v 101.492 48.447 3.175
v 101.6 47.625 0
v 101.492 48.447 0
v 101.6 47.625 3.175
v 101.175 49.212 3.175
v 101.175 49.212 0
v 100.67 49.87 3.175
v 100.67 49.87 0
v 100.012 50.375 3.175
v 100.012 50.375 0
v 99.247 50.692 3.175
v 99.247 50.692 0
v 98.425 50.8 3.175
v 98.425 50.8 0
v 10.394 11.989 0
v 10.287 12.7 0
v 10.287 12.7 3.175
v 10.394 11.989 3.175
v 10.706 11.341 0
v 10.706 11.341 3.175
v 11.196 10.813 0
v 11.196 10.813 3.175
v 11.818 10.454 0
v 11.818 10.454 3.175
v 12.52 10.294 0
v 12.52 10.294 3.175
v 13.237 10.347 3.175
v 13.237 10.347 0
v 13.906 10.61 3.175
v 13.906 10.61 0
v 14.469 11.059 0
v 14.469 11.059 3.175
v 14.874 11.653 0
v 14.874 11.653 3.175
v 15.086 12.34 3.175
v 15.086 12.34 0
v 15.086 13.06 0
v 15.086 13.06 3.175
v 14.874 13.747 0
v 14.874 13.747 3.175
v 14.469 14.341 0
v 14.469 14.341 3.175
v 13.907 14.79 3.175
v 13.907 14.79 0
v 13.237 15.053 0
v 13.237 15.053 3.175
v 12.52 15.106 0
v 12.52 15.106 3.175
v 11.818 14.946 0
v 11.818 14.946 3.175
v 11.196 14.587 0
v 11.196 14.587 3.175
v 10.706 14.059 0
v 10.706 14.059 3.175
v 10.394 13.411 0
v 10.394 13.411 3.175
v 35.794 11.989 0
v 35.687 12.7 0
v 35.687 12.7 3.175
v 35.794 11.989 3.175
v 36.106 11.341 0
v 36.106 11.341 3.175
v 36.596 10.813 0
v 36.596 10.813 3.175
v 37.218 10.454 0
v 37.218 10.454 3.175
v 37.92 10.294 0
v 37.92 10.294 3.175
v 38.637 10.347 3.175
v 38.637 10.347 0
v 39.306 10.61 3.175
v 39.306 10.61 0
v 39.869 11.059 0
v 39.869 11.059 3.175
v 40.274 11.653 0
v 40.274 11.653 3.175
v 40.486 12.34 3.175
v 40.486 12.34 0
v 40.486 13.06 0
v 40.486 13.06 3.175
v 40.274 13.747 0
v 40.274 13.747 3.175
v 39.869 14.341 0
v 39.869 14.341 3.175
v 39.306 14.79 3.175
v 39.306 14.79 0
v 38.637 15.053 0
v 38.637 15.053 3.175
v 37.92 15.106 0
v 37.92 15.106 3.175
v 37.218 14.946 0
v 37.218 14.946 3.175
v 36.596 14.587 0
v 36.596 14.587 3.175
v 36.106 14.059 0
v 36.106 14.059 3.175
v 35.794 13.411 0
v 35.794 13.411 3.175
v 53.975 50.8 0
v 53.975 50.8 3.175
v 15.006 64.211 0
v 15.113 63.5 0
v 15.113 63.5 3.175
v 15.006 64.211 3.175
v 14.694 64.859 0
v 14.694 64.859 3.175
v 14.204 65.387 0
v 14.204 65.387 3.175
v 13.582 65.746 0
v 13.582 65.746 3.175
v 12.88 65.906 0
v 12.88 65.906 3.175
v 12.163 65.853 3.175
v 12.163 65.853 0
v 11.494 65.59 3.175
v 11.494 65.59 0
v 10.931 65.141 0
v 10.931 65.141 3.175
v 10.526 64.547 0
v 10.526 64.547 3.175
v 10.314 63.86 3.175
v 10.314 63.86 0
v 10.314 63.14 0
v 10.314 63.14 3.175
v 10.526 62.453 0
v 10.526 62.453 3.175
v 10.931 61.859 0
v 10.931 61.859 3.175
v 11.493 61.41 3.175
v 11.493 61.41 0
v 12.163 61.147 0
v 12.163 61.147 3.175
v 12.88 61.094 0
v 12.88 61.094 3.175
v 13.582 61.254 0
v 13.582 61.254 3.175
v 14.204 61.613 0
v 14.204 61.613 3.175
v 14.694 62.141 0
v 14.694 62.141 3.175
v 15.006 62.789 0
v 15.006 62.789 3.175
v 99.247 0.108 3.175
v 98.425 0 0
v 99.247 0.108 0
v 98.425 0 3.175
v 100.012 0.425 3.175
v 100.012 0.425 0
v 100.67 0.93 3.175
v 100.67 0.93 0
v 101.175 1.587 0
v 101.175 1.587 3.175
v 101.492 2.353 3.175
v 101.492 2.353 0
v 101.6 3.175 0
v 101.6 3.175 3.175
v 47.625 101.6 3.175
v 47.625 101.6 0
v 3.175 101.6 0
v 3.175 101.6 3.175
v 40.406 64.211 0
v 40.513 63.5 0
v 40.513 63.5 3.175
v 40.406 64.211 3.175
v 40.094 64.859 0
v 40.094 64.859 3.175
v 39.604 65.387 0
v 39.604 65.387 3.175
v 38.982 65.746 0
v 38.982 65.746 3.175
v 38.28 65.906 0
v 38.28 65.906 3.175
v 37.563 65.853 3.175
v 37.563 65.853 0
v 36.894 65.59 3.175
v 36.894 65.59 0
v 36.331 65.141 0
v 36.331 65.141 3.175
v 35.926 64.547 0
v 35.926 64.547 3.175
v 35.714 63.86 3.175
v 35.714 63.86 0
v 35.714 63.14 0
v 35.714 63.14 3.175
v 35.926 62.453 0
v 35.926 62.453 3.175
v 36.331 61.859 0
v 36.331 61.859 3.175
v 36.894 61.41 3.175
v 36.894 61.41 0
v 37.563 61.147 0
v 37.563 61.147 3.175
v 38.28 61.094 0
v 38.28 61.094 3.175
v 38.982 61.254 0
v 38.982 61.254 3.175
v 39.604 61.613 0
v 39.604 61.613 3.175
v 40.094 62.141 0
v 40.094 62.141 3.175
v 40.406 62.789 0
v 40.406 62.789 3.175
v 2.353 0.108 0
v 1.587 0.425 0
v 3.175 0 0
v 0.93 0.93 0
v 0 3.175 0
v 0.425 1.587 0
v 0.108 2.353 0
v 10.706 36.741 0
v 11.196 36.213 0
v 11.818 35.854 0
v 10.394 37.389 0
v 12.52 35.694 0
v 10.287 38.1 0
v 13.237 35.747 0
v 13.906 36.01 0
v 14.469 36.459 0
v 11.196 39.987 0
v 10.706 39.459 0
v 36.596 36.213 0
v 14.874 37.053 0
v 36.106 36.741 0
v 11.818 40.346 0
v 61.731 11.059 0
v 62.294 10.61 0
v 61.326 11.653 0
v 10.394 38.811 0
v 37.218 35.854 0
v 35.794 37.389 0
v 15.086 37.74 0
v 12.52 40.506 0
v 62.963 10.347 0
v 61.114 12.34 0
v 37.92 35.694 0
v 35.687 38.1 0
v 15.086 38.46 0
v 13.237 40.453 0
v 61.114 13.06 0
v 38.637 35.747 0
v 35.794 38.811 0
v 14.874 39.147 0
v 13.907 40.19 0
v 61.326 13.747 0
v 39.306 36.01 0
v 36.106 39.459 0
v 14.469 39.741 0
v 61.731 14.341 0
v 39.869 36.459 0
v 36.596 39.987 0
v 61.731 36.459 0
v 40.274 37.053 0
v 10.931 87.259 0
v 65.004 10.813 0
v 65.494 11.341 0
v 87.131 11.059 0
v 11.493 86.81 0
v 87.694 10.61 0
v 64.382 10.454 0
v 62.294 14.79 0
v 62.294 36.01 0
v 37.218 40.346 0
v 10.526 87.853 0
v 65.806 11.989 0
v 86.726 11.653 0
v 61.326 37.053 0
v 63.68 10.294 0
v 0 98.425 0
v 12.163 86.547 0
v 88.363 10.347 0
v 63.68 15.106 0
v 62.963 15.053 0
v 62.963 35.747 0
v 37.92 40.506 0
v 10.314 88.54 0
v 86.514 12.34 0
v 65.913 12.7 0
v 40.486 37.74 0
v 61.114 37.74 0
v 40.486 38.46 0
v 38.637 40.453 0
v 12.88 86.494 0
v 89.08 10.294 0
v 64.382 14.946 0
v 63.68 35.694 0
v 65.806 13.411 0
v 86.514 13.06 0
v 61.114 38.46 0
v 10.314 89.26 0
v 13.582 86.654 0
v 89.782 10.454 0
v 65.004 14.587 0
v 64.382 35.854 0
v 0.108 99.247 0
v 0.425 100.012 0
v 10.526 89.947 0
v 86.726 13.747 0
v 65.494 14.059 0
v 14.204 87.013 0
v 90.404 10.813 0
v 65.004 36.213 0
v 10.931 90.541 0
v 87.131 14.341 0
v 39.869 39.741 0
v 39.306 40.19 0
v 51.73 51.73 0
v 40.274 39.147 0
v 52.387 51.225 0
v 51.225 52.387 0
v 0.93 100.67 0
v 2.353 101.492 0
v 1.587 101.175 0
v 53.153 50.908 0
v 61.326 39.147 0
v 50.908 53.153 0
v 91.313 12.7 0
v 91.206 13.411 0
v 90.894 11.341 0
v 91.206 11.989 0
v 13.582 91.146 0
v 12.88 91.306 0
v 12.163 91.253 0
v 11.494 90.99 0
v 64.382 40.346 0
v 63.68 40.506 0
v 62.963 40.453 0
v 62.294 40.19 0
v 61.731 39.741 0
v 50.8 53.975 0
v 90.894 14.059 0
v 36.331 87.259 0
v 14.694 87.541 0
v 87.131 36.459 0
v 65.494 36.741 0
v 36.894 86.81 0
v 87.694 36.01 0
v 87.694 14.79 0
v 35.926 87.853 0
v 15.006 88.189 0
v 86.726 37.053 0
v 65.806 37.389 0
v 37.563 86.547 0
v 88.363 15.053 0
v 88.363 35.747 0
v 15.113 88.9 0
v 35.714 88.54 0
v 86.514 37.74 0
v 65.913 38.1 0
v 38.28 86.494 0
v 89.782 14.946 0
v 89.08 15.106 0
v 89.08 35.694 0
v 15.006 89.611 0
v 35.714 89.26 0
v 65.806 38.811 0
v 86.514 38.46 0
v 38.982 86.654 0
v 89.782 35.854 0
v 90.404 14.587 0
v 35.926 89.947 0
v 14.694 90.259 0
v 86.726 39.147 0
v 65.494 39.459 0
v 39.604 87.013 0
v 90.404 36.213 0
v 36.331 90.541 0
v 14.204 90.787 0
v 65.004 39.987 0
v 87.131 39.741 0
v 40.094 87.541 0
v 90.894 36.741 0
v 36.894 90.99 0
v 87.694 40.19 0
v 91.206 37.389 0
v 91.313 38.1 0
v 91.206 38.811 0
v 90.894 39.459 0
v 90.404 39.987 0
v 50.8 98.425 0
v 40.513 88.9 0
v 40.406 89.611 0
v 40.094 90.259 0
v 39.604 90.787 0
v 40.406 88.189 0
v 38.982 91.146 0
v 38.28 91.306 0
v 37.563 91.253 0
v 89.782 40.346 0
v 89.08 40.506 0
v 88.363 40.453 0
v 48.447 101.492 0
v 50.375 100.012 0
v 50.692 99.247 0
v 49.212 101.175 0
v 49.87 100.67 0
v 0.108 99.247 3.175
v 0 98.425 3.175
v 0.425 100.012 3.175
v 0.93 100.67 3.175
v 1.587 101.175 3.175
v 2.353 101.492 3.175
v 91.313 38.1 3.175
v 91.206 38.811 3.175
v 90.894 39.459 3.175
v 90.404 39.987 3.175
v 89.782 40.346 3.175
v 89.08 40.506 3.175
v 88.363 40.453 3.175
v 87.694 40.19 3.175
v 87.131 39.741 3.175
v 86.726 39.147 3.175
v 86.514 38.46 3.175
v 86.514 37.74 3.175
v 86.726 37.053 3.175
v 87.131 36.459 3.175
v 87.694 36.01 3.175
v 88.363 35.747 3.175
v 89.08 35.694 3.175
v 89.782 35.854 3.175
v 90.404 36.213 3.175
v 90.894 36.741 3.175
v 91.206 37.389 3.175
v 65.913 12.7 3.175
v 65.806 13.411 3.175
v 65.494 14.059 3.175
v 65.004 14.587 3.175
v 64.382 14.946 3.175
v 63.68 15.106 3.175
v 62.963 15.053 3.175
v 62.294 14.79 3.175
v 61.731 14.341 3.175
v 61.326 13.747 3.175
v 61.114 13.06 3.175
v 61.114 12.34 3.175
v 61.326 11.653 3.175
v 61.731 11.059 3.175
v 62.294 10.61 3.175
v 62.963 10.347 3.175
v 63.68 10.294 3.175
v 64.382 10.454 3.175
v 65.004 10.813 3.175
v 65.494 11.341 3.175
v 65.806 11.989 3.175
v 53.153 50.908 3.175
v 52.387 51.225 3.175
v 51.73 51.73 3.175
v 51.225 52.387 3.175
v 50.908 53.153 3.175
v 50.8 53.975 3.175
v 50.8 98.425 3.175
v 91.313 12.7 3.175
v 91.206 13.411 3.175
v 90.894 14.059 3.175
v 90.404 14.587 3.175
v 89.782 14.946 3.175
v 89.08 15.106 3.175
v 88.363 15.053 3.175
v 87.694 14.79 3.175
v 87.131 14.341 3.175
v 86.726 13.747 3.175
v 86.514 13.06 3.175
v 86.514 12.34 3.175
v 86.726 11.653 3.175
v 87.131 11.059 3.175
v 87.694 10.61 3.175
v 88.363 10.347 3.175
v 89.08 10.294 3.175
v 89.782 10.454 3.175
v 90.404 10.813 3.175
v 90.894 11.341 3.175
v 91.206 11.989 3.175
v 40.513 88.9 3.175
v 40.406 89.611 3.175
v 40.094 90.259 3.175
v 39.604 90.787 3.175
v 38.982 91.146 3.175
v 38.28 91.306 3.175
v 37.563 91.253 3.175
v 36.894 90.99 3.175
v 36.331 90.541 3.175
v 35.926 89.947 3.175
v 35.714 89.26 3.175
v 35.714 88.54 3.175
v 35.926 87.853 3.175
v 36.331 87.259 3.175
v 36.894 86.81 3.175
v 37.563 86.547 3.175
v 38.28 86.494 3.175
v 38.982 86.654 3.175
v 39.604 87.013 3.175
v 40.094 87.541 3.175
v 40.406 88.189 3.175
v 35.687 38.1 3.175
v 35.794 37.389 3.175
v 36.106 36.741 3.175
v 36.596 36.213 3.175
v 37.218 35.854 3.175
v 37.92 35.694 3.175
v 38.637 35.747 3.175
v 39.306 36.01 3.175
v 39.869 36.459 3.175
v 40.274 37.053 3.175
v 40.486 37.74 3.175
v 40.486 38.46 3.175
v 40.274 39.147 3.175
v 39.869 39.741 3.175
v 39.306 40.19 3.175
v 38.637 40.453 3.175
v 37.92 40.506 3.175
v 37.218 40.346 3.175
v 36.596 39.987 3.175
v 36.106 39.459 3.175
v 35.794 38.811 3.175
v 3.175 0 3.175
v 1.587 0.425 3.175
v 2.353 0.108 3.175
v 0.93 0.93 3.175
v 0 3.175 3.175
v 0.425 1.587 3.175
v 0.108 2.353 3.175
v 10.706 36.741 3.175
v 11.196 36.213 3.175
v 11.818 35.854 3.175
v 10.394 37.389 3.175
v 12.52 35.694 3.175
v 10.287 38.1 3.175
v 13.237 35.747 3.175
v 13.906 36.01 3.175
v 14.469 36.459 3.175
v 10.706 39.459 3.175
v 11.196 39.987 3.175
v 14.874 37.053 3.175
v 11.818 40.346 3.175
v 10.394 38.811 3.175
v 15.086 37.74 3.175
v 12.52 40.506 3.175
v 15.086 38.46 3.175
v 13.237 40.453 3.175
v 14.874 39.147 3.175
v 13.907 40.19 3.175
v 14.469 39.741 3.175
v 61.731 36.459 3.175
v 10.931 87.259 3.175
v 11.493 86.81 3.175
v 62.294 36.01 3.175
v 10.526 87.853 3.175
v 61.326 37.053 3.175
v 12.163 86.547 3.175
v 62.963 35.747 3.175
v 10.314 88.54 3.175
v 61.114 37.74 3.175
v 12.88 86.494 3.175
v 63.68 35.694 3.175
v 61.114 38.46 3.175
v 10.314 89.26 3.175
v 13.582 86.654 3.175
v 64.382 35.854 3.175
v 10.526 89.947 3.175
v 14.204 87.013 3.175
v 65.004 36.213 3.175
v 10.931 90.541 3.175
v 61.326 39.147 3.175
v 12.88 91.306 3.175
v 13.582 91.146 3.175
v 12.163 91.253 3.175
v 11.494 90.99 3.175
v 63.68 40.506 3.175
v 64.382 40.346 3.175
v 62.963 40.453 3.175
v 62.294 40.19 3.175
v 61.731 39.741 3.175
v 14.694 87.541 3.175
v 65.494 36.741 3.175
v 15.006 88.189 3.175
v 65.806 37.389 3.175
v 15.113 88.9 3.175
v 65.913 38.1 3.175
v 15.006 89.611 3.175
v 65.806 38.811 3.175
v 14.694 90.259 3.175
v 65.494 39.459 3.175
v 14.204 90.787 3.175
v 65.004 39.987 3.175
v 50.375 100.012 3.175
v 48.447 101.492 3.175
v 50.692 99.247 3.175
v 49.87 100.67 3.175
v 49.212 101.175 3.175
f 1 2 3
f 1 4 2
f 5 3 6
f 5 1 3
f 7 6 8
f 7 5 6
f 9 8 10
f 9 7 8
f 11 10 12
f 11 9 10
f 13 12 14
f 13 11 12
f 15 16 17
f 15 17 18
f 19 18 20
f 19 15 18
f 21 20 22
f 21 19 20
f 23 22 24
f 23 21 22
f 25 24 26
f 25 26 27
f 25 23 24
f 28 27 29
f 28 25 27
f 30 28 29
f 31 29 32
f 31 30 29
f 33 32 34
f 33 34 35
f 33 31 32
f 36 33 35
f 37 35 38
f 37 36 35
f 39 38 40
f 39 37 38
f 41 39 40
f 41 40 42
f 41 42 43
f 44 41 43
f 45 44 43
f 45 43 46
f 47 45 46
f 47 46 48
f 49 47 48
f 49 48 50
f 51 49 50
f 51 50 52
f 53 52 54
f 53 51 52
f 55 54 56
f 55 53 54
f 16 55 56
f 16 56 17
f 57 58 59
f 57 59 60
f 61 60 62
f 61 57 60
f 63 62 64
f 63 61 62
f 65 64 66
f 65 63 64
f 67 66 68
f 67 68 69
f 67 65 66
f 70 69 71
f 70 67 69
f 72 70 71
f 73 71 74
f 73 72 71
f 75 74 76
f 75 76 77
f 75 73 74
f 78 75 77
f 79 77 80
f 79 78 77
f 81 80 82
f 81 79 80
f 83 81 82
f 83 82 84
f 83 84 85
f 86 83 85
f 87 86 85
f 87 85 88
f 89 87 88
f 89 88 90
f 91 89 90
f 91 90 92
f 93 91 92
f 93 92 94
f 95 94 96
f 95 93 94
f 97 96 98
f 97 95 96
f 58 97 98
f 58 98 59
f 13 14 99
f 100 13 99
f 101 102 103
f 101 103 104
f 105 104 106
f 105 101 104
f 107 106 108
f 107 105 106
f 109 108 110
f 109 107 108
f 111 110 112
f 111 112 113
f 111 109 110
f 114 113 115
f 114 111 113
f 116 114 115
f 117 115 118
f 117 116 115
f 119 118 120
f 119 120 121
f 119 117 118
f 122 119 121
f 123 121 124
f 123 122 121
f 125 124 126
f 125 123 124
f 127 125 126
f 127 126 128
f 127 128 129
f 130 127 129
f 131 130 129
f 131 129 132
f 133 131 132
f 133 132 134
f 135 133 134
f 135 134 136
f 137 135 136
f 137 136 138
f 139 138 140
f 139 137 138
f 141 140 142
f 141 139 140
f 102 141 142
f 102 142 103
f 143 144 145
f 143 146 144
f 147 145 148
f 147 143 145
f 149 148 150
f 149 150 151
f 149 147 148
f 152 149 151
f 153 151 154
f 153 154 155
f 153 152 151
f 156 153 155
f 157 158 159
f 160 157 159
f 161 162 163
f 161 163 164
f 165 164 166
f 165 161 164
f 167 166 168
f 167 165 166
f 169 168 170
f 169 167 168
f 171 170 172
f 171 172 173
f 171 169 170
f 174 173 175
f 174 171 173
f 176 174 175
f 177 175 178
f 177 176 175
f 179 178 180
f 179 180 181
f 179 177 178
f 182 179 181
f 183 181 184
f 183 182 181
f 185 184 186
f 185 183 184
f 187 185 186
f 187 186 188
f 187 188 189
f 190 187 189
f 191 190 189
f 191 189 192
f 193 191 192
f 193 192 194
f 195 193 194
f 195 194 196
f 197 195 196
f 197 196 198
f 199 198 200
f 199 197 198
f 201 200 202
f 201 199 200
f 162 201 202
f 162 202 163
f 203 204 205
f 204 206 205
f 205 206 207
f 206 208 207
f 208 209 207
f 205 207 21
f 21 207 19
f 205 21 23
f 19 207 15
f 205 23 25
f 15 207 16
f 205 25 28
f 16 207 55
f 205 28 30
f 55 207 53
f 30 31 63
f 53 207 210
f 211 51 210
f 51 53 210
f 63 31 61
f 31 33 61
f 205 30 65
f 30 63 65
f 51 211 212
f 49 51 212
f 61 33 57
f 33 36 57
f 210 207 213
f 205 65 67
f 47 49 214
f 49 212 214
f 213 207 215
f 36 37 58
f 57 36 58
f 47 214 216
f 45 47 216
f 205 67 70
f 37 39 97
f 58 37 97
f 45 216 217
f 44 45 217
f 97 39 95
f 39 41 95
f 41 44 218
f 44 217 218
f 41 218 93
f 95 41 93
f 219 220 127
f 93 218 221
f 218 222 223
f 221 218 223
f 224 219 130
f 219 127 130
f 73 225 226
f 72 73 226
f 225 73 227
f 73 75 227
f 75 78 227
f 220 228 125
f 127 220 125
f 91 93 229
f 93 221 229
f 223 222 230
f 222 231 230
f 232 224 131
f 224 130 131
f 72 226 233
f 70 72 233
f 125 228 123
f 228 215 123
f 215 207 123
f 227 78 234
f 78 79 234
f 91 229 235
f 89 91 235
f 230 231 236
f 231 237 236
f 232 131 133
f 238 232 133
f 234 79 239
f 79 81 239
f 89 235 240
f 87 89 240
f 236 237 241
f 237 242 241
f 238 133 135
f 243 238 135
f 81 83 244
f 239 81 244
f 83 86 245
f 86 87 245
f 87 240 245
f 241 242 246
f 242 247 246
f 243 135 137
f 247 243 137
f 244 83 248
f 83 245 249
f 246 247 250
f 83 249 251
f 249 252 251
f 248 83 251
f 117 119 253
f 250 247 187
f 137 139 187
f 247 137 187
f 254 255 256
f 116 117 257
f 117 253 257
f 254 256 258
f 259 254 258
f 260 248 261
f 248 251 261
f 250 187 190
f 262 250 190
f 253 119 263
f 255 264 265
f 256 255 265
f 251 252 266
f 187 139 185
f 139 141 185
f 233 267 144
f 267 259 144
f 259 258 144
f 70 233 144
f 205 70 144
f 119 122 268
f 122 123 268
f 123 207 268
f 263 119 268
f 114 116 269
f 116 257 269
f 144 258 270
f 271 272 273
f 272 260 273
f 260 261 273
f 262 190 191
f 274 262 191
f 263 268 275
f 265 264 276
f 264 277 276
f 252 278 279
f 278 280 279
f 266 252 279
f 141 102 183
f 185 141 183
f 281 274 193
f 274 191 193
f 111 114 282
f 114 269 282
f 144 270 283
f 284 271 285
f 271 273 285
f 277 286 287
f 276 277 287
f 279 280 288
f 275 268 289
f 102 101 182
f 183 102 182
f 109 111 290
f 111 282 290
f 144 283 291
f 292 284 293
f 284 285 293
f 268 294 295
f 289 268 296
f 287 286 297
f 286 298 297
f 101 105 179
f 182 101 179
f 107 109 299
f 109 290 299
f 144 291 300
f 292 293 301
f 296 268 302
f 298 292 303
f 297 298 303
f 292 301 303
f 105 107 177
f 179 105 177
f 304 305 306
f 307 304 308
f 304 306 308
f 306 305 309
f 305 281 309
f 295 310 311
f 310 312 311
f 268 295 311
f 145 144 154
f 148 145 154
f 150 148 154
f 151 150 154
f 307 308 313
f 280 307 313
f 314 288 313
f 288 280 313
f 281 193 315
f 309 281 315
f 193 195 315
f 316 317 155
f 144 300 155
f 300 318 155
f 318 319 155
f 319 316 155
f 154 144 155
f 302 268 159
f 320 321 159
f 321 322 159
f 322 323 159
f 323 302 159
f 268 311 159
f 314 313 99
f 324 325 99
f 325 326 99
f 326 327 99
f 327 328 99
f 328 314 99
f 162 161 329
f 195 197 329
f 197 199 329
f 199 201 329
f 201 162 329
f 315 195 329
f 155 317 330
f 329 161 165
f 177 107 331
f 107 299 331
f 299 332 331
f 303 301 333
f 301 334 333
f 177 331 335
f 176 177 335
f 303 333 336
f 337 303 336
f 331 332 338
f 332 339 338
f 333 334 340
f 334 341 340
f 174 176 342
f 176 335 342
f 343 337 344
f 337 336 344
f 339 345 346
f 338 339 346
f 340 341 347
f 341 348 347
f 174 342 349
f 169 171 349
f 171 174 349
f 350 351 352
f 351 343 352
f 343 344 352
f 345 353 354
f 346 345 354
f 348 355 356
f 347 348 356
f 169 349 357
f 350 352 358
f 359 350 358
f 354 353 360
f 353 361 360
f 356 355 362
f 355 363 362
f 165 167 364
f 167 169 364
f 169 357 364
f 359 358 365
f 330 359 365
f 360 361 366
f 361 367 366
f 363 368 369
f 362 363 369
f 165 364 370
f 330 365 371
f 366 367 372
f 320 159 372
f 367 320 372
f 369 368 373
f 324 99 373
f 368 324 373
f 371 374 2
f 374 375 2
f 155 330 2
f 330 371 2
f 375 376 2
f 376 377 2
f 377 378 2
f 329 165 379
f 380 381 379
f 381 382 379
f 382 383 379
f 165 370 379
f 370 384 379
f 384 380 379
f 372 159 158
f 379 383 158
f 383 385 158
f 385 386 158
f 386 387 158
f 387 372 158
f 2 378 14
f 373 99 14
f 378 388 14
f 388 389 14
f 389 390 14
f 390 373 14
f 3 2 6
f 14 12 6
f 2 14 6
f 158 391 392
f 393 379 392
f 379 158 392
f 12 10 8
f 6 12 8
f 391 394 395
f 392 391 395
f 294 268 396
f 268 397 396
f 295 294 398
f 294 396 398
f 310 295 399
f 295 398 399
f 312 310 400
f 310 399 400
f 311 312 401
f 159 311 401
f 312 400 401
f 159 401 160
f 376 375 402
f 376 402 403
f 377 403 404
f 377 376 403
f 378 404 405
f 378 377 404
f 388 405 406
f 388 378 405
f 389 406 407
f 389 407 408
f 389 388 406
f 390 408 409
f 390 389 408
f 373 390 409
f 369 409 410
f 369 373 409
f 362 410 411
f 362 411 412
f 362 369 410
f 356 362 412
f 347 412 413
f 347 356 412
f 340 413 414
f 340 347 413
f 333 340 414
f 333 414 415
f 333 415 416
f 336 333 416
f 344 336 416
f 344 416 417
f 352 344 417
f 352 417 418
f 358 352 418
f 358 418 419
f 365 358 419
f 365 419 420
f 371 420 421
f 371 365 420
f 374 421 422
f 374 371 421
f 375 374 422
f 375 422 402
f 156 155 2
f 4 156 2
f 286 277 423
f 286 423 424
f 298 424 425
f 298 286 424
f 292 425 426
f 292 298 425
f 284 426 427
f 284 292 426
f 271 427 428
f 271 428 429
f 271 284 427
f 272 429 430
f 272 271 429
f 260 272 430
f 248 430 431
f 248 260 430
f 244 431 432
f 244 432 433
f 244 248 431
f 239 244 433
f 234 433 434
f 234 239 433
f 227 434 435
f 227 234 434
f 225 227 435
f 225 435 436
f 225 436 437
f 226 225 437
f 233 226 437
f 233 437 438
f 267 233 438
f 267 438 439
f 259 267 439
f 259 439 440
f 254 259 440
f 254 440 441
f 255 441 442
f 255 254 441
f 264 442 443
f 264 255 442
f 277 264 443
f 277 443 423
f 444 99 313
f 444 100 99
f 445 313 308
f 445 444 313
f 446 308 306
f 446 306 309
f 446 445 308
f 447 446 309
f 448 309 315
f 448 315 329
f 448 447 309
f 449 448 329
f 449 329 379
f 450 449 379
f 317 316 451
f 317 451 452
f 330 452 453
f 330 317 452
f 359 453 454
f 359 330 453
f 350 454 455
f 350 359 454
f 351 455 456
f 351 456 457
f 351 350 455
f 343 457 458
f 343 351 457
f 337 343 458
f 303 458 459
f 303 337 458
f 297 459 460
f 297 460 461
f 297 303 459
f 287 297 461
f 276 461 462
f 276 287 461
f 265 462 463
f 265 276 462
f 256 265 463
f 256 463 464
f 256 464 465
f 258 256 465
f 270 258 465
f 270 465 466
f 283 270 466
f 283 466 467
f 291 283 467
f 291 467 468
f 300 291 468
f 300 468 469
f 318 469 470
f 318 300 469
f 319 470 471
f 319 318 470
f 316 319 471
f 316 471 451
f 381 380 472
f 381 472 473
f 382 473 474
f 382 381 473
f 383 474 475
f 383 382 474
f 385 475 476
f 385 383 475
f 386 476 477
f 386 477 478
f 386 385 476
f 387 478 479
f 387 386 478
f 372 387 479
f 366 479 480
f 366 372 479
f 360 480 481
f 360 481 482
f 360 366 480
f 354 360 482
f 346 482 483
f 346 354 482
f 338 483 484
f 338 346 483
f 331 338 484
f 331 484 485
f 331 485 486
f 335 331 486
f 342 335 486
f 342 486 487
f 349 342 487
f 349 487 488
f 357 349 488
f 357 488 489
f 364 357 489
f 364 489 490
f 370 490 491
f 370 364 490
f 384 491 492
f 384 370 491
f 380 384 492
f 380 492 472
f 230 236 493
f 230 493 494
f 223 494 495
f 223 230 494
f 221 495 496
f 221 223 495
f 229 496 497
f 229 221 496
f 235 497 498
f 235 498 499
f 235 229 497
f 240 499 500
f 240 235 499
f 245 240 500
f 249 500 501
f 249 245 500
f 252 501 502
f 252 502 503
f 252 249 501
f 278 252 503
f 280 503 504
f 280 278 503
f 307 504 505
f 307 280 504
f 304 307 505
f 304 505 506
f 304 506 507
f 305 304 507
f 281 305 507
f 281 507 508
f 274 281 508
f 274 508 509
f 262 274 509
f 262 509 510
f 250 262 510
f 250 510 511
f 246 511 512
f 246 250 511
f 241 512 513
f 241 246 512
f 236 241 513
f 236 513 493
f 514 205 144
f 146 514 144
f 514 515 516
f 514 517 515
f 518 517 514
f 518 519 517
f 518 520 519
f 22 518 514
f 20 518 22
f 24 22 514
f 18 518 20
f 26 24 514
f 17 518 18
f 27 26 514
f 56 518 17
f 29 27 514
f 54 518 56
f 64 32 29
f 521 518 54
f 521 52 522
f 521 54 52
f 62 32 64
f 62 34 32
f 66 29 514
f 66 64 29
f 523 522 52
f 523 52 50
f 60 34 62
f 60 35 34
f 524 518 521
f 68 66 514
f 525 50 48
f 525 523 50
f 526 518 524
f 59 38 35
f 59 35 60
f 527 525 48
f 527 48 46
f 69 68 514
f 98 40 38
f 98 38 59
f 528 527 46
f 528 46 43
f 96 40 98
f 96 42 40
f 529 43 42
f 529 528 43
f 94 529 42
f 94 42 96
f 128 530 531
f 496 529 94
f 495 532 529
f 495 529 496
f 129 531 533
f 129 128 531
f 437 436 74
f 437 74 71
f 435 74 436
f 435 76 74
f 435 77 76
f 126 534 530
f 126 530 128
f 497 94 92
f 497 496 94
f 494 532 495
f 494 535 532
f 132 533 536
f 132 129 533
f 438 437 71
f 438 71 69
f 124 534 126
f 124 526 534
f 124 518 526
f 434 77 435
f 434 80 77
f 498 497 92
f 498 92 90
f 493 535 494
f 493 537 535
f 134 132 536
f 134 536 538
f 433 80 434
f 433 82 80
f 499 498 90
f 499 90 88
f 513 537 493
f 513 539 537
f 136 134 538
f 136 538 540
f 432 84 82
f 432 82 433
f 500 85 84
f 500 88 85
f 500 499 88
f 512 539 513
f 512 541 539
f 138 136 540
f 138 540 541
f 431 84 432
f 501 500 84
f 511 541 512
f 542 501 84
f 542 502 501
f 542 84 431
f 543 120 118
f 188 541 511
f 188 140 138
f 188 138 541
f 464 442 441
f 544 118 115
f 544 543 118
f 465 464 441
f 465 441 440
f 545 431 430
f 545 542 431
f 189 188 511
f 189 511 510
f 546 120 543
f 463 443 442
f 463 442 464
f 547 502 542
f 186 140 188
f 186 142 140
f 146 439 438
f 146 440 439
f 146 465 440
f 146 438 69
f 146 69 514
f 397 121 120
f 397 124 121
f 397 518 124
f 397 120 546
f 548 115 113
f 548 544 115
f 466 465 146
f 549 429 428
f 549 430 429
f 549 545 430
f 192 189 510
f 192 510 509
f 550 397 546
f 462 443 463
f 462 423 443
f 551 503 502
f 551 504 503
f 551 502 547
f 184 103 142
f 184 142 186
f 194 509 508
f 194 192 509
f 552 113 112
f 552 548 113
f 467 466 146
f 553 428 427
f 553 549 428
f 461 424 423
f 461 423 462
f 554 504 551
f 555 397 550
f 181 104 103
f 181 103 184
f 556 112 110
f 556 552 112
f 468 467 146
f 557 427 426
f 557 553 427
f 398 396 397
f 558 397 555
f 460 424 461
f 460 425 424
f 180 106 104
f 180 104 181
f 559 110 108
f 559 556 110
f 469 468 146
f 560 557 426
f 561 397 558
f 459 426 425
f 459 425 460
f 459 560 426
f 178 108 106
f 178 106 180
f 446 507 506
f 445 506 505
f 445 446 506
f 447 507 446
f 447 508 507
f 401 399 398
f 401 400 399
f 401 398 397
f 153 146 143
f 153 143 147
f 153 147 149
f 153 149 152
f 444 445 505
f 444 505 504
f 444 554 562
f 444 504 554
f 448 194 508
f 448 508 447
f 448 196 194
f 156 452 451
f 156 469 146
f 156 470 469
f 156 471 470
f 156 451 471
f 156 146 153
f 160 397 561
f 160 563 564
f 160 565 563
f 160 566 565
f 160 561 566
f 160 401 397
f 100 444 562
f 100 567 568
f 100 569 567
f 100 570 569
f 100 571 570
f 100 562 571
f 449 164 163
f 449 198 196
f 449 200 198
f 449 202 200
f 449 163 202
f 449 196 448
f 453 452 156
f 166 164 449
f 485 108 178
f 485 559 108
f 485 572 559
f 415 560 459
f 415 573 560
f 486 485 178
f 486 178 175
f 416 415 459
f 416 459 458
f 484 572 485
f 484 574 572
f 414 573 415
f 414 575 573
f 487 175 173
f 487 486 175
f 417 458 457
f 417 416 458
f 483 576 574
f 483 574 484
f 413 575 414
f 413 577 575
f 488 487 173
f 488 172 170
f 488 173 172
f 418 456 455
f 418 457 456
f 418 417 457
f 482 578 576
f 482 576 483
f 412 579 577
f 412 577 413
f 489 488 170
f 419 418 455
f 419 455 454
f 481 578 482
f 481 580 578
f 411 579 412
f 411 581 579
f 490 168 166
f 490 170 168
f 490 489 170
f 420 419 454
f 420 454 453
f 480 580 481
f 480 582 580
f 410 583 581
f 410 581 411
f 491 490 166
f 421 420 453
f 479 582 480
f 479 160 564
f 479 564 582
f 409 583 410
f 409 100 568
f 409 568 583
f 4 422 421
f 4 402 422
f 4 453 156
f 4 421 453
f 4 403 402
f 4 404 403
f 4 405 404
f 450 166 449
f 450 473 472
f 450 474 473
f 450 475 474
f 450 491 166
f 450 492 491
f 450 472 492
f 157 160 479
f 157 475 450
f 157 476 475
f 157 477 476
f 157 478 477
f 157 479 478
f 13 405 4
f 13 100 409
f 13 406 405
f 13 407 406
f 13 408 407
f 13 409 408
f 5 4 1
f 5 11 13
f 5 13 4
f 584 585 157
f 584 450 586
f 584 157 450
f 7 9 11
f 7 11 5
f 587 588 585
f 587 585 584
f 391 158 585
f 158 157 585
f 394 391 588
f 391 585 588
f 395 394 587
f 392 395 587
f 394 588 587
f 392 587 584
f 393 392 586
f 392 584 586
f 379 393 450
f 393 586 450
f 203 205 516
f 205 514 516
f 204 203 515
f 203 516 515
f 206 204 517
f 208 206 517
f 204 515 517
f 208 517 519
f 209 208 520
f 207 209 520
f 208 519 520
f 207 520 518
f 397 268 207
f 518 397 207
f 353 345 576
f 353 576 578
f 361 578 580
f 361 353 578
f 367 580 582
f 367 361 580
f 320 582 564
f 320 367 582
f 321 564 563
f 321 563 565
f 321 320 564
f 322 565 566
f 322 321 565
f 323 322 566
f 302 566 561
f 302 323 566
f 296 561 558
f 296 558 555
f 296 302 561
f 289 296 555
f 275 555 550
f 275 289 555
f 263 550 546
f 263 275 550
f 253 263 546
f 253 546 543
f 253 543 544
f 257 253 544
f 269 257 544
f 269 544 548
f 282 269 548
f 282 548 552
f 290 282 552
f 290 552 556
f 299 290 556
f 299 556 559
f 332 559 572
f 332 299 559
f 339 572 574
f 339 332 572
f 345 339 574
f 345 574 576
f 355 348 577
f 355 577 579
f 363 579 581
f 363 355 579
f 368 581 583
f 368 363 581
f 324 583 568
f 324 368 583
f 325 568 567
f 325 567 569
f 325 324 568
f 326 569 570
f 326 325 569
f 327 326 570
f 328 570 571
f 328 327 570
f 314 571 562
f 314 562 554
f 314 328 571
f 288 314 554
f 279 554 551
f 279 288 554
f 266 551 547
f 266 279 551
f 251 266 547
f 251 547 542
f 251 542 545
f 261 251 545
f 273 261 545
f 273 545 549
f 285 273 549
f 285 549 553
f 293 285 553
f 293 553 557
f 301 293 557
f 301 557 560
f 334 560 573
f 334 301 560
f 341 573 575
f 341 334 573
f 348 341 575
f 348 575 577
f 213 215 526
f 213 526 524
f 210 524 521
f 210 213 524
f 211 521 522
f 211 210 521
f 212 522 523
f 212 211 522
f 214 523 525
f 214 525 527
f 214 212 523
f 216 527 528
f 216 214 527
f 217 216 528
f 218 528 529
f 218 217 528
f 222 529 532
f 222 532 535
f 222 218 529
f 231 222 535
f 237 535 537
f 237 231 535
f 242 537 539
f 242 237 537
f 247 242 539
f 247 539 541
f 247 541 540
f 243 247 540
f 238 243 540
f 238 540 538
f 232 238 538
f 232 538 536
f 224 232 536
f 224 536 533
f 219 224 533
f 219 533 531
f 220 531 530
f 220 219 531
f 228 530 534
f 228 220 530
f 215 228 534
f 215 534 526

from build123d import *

# Parameters (mm, degrees)
SKETCH1_R           = 2.413
BOSS_EXTRUDE1_DEPTH = 3.175
FILLET1_R           = 3.175


with BuildPart() as part:
    # Sketch1 → Boss-Extrude1 (new body)
    with BuildSketch(Plane.XY):
        Polygon((0, 0), (101.6, 0), (101.6, 50.8), (50.8, 50.8), (50.8, 101.6), (0, 101.6), align=None)
        with Locations((12.7, 88.9)):
            Circle(SKETCH1_R, mode=Mode.SUBTRACT)
        with Locations((38.1, 88.9)):
            Circle(SKETCH1_R, mode=Mode.SUBTRACT)
        with Locations((38.1, 63.5)):
            Circle(SKETCH1_R, mode=Mode.SUBTRACT)
        with Locations((12.7, 63.5)):
            Circle(SKETCH1_R, mode=Mode.SUBTRACT)
        with Locations(Location((38.1, 12.7, 0), (0, 0, 180))):
            Circle(SKETCH1_R, mode=Mode.SUBTRACT)
        with Locations(Location((38.1, 38.1, 0), (0, 0, 180))):
            Circle(SKETCH1_R, mode=Mode.SUBTRACT)
        with Locations(Location((12.7, 38.1, 0), (0, 0, 180))):
            Circle(SKETCH1_R, mode=Mode.SUBTRACT)
        with Locations(Location((12.7, 12.7, 0), (0, 0, 180))):
            Circle(SKETCH1_R, mode=Mode.SUBTRACT)
        with Locations((88.9, 12.7)):
            Circle(SKETCH1_R, mode=Mode.SUBTRACT)
        with Locations((63.5, 12.7)):
            Circle(SKETCH1_R, mode=Mode.SUBTRACT)
        with Locations((63.5, 38.1)):
            Circle(SKETCH1_R, mode=Mode.SUBTRACT)
        with Locations((88.9, 38.1)):
            Circle(SKETCH1_R, mode=Mode.SUBTRACT)
    extrude(amount=BOSS_EXTRUDE1_DEPTH)

    # Fillet1
    fillet1_edges = [part.edges().sort_by_distance(p)[0] for p in [
        (0, 101.6, 1.5875),
        (50.8, 101.6, 1.5875),
        (50.8, 50.8, 1.5875),
        (101.6, 50.8, 1.5875),
        (101.6, 0, 1.5875),
        (0, 0, 1.5875),
    ]]
    fillet(fillet1_edges, radius=FILLET1_R)


solid = part.part
